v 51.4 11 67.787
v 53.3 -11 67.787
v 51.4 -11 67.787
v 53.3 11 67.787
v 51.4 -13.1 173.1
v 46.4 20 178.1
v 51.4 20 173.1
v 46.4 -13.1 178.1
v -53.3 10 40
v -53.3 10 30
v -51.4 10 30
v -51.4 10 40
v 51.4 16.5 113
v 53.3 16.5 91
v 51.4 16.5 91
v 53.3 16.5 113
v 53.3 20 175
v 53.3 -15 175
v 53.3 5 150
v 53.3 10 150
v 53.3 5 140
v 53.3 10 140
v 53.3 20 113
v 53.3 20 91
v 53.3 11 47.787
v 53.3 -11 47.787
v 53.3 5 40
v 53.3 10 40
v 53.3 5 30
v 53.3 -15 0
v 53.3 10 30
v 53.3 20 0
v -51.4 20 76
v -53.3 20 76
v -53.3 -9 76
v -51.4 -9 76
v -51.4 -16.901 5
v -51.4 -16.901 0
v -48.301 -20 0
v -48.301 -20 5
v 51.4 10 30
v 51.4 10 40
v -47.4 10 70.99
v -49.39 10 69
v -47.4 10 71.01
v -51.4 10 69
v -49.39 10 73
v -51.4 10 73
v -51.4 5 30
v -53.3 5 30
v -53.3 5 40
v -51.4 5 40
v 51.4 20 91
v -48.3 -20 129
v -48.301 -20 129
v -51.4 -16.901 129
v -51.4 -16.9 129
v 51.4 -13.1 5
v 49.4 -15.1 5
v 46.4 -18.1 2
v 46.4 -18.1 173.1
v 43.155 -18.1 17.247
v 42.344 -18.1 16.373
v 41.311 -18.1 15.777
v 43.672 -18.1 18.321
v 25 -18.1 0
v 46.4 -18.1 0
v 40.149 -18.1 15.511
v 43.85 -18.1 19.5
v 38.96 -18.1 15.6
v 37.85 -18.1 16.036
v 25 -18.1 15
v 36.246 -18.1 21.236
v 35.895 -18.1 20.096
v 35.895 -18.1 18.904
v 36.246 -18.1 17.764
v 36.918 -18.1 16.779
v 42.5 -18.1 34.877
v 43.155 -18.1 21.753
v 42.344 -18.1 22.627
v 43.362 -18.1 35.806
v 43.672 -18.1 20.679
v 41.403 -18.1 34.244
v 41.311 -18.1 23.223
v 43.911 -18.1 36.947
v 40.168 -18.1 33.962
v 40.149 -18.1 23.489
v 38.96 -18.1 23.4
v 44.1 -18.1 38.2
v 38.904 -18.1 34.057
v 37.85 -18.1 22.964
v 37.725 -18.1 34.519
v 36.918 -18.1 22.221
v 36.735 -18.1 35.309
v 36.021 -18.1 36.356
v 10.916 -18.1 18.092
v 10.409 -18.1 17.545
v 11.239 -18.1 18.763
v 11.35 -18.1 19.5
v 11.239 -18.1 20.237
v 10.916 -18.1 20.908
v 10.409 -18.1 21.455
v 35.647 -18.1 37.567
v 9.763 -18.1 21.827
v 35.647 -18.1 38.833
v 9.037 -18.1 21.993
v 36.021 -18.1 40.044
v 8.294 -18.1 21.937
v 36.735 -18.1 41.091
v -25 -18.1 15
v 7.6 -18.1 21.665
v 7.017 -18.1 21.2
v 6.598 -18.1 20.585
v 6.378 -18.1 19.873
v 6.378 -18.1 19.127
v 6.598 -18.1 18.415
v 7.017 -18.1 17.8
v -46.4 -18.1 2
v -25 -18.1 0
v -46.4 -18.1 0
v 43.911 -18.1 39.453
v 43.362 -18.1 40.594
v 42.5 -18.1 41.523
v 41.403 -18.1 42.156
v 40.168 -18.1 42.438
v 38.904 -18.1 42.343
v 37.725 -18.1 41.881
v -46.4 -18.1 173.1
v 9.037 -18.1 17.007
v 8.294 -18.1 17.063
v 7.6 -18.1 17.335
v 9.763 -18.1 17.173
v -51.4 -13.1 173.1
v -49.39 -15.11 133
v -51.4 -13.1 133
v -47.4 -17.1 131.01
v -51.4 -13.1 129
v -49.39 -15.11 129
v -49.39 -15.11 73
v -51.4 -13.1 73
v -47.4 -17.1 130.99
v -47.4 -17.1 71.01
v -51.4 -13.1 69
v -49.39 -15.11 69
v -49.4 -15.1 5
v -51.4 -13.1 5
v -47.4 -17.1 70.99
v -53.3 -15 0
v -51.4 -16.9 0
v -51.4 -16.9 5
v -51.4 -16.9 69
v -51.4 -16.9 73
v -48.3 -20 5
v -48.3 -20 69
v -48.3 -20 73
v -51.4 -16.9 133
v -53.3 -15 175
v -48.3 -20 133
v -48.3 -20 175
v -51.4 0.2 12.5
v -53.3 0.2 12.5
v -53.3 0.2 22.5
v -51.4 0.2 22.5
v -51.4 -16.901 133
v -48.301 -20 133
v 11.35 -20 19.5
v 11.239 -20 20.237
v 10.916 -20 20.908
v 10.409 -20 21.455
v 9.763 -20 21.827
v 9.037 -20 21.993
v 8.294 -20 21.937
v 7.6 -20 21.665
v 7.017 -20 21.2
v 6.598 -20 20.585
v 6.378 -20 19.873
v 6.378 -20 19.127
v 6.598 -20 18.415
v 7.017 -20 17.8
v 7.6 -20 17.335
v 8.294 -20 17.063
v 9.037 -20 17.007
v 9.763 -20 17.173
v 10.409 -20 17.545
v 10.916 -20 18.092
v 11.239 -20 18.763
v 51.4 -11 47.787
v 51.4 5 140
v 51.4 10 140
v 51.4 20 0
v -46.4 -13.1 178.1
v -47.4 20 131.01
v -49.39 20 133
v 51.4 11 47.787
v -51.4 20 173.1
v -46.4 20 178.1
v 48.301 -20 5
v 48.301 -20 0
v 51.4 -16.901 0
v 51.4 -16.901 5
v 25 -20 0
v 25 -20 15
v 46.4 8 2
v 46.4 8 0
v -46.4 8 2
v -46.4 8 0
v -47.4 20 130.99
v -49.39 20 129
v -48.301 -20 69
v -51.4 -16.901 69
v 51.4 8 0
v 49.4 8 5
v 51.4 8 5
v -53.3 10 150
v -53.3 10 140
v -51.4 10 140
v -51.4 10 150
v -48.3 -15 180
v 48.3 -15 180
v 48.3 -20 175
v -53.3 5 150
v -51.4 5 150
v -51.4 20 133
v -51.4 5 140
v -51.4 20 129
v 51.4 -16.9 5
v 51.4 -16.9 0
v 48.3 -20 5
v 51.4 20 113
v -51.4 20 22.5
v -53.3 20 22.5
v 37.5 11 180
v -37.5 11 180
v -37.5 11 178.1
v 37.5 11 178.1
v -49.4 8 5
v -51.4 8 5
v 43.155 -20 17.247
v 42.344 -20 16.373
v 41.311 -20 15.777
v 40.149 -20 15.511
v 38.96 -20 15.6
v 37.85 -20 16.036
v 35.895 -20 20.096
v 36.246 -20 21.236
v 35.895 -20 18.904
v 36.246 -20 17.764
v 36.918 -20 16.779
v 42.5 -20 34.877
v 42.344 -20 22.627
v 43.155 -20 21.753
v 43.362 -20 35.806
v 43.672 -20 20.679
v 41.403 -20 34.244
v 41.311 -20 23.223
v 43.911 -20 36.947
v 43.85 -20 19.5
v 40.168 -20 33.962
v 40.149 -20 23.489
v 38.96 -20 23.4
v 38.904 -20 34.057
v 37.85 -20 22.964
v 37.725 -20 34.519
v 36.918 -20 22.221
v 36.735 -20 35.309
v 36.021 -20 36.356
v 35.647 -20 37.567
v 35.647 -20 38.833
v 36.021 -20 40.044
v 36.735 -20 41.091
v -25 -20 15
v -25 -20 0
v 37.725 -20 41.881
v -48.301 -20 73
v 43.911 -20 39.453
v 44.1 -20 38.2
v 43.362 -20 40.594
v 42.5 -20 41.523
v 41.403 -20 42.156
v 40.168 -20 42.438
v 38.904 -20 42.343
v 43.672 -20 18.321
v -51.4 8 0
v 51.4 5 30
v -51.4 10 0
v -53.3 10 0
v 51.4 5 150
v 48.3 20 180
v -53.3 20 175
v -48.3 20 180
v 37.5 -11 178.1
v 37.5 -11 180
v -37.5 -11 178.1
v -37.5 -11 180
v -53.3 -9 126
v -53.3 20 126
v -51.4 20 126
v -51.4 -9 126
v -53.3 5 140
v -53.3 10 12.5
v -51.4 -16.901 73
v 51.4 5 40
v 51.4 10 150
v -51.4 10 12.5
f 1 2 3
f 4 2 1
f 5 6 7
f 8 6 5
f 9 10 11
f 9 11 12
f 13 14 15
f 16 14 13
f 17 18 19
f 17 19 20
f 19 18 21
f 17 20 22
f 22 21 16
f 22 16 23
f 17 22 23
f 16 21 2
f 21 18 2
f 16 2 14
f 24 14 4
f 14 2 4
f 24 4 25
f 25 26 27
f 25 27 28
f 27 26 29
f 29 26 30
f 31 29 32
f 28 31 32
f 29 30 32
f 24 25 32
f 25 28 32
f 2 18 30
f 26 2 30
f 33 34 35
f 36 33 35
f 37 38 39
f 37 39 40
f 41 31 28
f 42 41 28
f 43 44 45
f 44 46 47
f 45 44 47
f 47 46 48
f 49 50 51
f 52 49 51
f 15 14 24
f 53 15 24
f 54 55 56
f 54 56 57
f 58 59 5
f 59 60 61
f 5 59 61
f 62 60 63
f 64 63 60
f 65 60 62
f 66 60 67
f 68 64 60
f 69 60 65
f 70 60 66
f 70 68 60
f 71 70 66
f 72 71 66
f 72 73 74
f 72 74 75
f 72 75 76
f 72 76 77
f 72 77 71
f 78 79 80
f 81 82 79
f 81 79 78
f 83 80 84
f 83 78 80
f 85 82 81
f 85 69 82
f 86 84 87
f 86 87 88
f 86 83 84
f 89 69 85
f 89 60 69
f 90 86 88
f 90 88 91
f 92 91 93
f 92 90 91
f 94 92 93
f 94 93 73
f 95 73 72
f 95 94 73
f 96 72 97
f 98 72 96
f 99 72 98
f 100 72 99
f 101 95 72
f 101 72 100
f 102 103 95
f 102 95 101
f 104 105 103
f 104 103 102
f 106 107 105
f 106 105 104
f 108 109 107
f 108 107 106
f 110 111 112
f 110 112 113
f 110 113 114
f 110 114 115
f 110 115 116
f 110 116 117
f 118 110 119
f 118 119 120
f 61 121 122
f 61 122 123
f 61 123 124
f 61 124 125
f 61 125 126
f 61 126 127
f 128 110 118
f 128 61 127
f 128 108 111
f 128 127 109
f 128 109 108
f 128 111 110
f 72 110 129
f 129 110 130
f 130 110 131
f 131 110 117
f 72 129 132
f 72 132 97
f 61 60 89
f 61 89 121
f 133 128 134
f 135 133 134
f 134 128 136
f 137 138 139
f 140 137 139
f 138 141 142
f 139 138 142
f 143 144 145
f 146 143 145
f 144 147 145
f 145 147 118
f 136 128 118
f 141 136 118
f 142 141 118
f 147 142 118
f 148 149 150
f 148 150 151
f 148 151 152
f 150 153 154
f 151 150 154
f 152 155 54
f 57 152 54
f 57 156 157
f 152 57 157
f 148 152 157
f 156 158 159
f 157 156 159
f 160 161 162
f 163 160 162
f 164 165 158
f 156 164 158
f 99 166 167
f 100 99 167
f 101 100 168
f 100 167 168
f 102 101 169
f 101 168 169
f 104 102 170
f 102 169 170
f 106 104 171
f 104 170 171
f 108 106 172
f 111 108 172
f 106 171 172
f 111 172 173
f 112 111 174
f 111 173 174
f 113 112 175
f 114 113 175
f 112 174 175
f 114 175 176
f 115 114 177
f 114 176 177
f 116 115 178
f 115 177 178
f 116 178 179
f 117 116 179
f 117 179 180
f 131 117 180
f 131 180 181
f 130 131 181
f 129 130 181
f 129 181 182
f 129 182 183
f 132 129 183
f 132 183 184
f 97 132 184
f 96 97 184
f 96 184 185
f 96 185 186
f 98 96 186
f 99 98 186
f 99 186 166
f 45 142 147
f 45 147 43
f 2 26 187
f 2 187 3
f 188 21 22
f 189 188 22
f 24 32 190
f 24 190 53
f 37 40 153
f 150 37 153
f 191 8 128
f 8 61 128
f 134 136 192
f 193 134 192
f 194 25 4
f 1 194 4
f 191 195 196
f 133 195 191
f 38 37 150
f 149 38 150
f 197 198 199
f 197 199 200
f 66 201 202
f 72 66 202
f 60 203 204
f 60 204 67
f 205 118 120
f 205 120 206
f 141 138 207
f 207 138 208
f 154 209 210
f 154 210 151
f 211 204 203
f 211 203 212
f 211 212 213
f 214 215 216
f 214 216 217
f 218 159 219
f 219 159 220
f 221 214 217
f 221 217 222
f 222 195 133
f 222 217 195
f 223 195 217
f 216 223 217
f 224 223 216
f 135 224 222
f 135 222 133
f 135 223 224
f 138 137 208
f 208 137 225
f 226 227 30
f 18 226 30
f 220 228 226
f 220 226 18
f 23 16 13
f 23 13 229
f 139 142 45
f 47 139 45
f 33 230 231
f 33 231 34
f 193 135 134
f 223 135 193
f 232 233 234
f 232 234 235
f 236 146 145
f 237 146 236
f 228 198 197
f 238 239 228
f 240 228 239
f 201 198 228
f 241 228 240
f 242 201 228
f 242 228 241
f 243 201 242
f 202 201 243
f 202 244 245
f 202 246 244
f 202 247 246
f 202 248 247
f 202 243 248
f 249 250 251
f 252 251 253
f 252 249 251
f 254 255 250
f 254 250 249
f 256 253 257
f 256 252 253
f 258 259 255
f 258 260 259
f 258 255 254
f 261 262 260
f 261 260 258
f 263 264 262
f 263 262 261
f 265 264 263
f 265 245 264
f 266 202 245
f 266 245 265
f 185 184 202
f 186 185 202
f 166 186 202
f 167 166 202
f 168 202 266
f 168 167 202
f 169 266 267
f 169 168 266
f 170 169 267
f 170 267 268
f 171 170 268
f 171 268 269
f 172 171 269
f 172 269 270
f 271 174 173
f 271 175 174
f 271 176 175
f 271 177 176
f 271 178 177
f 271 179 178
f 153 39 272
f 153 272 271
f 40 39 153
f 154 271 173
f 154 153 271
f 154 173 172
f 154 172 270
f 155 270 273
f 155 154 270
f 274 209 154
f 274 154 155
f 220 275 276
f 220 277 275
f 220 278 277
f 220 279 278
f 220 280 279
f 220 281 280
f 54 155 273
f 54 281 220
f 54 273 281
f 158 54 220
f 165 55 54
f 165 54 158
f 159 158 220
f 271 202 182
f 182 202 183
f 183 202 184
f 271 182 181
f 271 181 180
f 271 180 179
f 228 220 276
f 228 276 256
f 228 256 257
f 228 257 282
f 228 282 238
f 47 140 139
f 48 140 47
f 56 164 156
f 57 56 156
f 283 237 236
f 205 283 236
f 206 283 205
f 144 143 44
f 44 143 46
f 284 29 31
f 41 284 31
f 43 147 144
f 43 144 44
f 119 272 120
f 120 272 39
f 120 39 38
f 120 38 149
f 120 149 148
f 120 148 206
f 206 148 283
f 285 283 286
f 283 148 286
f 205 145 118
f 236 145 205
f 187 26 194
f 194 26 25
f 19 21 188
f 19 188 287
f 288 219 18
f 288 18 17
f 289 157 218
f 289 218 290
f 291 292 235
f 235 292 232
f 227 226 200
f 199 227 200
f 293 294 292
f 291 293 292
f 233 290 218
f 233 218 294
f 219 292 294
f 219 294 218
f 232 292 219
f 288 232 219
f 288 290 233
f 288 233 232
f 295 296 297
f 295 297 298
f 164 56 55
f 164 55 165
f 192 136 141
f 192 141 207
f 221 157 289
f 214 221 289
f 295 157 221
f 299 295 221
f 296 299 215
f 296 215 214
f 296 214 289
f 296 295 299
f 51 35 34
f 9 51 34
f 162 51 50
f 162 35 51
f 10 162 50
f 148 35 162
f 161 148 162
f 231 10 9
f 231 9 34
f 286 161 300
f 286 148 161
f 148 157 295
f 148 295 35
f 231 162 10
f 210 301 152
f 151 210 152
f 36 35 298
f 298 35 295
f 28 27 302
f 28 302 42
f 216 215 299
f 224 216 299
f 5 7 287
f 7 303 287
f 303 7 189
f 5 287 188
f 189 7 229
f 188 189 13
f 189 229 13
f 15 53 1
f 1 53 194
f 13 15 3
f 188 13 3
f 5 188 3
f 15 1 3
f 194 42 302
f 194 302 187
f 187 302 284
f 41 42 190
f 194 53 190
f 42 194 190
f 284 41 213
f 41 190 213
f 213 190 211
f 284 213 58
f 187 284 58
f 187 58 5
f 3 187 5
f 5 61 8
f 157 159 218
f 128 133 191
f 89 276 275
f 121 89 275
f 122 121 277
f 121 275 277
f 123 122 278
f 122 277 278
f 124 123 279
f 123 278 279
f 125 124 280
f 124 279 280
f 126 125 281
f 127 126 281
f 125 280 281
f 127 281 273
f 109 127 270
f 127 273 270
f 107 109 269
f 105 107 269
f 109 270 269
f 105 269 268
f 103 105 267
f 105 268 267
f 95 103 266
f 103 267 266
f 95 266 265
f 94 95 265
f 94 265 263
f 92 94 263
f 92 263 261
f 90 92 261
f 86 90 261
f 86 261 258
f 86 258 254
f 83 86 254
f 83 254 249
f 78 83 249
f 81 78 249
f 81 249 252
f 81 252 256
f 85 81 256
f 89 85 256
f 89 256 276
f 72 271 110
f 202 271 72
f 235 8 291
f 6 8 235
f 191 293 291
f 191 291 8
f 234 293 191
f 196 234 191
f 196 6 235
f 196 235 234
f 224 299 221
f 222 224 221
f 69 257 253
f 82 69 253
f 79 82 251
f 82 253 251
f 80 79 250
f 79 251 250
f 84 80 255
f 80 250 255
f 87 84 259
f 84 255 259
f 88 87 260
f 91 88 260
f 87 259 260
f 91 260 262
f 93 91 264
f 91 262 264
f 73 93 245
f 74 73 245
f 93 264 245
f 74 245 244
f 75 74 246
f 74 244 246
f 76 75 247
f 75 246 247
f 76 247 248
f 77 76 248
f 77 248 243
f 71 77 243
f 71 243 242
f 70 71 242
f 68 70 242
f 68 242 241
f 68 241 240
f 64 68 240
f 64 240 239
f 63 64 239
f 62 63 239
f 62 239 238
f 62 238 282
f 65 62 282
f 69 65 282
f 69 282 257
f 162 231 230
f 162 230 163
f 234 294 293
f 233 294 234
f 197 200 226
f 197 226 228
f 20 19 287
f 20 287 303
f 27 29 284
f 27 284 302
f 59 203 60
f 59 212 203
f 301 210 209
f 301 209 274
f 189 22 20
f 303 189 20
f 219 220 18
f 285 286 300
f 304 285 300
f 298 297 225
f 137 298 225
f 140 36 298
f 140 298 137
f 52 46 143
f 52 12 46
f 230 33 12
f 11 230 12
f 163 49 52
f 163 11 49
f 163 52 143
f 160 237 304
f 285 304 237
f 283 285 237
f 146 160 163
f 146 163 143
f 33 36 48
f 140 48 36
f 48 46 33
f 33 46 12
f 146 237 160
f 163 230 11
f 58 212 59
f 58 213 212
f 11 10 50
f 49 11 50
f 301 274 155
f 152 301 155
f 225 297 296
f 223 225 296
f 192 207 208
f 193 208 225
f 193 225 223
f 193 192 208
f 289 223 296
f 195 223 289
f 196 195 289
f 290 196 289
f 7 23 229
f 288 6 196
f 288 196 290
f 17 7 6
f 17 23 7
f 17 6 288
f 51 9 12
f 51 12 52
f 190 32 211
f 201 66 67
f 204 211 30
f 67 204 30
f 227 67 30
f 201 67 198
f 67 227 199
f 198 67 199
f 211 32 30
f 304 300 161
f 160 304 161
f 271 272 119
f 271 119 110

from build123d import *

# Parameters (mm, degrees)
SKETCH_W        = 106.6
SKETCH_H        = 40
PAD_DEPTH       = 180
SKETCH001_W     = 102.8
SKETCH001_H     = 176.2
POCKET_DEPTH    = 38.1
SKETCH002_W     = 102.8
SKETCH002_H     = 1.9
POCKET001_DEPTH = 38.1
SKETCH003_W     = 50
SKETCH003_H     = 15
POCKET002_DEPTH = 5
SKETCH004_W     = 22
SKETCH004_H     = 20
POCKET003_DEPTH = 5
SKETCH005_W     = 75
SKETCH005_H     = 22
POCKET004_DEPTH = 5
SKETCH006_R     = 4
SKETCH006_R_2   = 4.25
POCKET005_DEPTH = 5
CHAMFER_SIZE    = 5
CHAMFER001_SIZE = 5
SKETCH007_W     = 5
SKETCH007_H     = 10
POCKET006_DEPTH = 5
SKETCH008_W     = 5
SKETCH008_H     = 10
POCKET007_DEPTH = 5
SKETCH009_W     = 19.8
SKETCH009_H     = 10
POCKET008_DEPTH = 5
SKETCH010_W     = 40
SKETCH010_H     = 5
PAD001_DEPTH    = 5
CHAMFER002_SIZE = 3.099
CHAMFER003_SIZE = 3
SKETCH011_W     = 40
SKETCH011_H     = 5
PAD002_DEPTH    = 5
CHAMFER004_SIZE = 3.099
CHAMFER005_SIZE = 3
SKETCH012_W     = 3.5
SKETCH012_H     = 22
POCKET009_DEPTH = 5
SKETCH013_W     = 3.5
SKETCH013_H     = 22
POCKET010_DEPTH = 5
SKETCH014_W     = 29
SKETCH014_H     = 50
POCKET011_DEPTH = 5
SKETCH015_W     = 102.8
SKETCH015_H     = 12
POCKET012_DEPTH = 5
SKETCH016_W     = 10
SKETCH016_H     = 12.5
POCKET013_DEPTH = 5
SKETCH017_W     = 40
SKETCH017_H     = 4
PAD003_DEPTH    = 4
CHAMFER006_SIZE = 3.099
CHAMFER007_SIZE = 1.99
SKETCH018_R     = 2.5
POCKET014_DEPTH = 5
SKETCH019_W     = 10
SKETCH019_H     = 8
POCKET015_DEPTH = 5


with BuildPart() as part:
    # Sketch → Pad (new body)
    with BuildSketch(Plane.XY):
        Rectangle(SKETCH_W, SKETCH_H)
    extrude(amount=PAD_DEPTH)

    # Sketch001 (on Face1 of Pad) → Pocket (cut)
    with BuildSketch(Plane(origin=(0, 20, 0), x_dir=(-1, 0, 0), z_dir=(0, 1, 0))):
        with Locations((0, 90)):
            Rectangle(SKETCH001_W, SKETCH001_H)
    extrude(amount=-POCKET_DEPTH, mode=Mode.SUBTRACT)

    # Sketch002 (on Face1 of Pocket) → Pocket001 (cut)
    with BuildSketch(Plane(origin=(0, 20, 0), x_dir=(-1, 0, 0), z_dir=(0, 1, 0))):
        with Locations((0, 0.95)):
            Rectangle(SKETCH002_W, SKETCH002_H)
    extrude(amount=-POCKET001_DEPTH, mode=Mode.SUBTRACT)

    # Sketch003 (on Face11 of Pocket001) → Pocket002 (cut)
    with BuildSketch(Plane.XZ.offset(20)):
        with Locations((0, 7.5)):
            Rectangle(SKETCH003_W, SKETCH003_H)
    extrude(amount=-POCKET002_DEPTH, mode=Mode.SUBTRACT)

    # Sketch004 (on Face9 of Pocket002) → Pocket003 (cut)
    with BuildSketch(Plane.YZ.offset(53.3)):
        with Locations((0, 57.78728)):
            Rectangle(SKETCH004_W, SKETCH004_H)
    extrude(amount=-POCKET003_DEPTH, mode=Mode.SUBTRACT)

    # Sketch005 (on Face10 of Pocket003) → Pocket004 (cut)
    with BuildSketch(Plane.XY.offset(180)):
        Rectangle(SKETCH005_W, SKETCH005_H)
    extrude(amount=-POCKET004_DEPTH, mode=Mode.SUBTRACT)

    # Sketch006 (on Face12 of Pocket004) → Pocket005 (cut)
    with BuildSketch(Plane.XZ.offset(20)):
        with Locations((39.85, 19.5)):
            Circle(SKETCH006_R)
        with Locations((39.85, 38.2)):
            Circle(SKETCH006_R_2)
    extrude(amount=-POCKET005_DEPTH, mode=Mode.SUBTRACT)

    # Chamfer
    chamfer_edges = [part.edges().sort_by_distance(p)[0] for p in [
        (-51.4, -18.1, 90),
        (-51.4, 0.95, 178.1),
        (0, -18.1, 178.1),
        (51.4, -18.1, 90),
        (51.4, 0.95, 178.1),
    ]]
    chamfer(chamfer_edges, length=CHAMFER_SIZE)

    # Chamfer001
    chamfer001_edges = [part.edges().sort_by_distance(p)[0] for p in [
        (53.3, -20, 90),
        (-53.3, -20, 90),
        (0, -20, 180),
        (53.3, 0, 180),
        (-53.3, 0, 180),
    ]]
    chamfer(chamfer001_edges, length=CHAMFER001_SIZE)

    # Sketch007 (on Face9 of Chamfer001) → Pocket006 (cut)
    with BuildSketch(Plane.YZ.offset(53.3)):
        with Locations((7.5, 145)):
            Rectangle(SKETCH007_W, SKETCH007_H)
        with Locations((7.5, 35)):
            Rectangle(SKETCH007_W, SKETCH007_H)
    extrude(amount=-POCKET006_DEPTH, mode=Mode.SUBTRACT)

    # Sketch008 (on Face2 of Pocket006) → Pocket007 (cut)
    with BuildSketch(Plane(origin=(-53.3, 0, 0), x_dir=(0, -1, 0), z_dir=(-1, 0, 0))):
        with Locations((-7.5, 145)):
            Rectangle(SKETCH008_W, SKETCH008_H)
        with Locations((-7.5, 35)):
            Rectangle(SKETCH008_W, SKETCH008_H)
    extrude(amount=-POCKET007_DEPTH, mode=Mode.SUBTRACT)

    # Sketch009 (on Face2 of Pocket007) → Pocket008 (cut)
    with BuildSketch(Plane(origin=(-53.3, 0, 0), x_dir=(0, -1, 0), z_dir=(-1, 0, 0))):
        with Locations((-10.1, 17.5)):
            Rectangle(SKETCH009_W, SKETCH009_H)
    extrude(amount=-POCKET008_DEPTH, mode=Mode.SUBTRACT)

    # Sketch010 (on Face4 of Pocket008) → Pad001 (join)
    with BuildSketch(Plane.YZ.offset(-51.4)):
        with Locations((0, 2.5)):
            Rectangle(SKETCH010_W, SKETCH010_H)
    extrude(amount=PAD001_DEPTH)

    # Chamfer002
    chamfer002_edges = [part.edges().sort_by_distance(p)[0] for p in [
        (-51.4, -20, 2.5),
    ]]
    chamfer(chamfer002_edges, length=CHAMFER002_SIZE)

    # Chamfer003
    chamfer003_edges = [part.edges().sort_by_distance(p)[0] for p in [
        (-46.4, 0.95, 5),
    ]]
    chamfer(chamfer003_edges, length=CHAMFER003_SIZE)

    # Sketch011 (on Face27 of Chamfer003) → Pad002 (join)
    with BuildSketch(Plane(origin=(51.4, 0, 0), x_dir=(0, -1, 0), z_dir=(-1, 0, 0))):
        with Locations((0, 2.5)):
            Rectangle(SKETCH011_W, SKETCH011_H)
    extrude(amount=PAD002_DEPTH)

    # Chamfer004
    chamfer004_edges = [part.edges().sort_by_distance(p)[0] for p in [
        (51.4, -20, 2.5),
    ]]
    chamfer(chamfer004_edges, length=CHAMFER004_SIZE)

    # Chamfer005
    chamfer005_edges = [part.edges().sort_by_distance(p)[0] for p in [
        (46.4, 0.95, 5),
    ]]
    chamfer(chamfer005_edges, length=CHAMFER005_SIZE)

    # Sketch012 (on Face15 of Chamfer005) → Pocket009 (cut)
    with BuildSketch(Plane.YZ.offset(53.3)):
        with Locations((18.25, 102)):
            Rectangle(SKETCH012_W, SKETCH012_H)
    extrude(amount=-POCKET009_DEPTH, mode=Mode.SUBTRACT)

    # Sketch013 (on Face52 of Pocket009) → Pocket010 (cut)
    with BuildSketch(Plane(origin=(-53.3, 0, 0), x_dir=(0, -1, 0), z_dir=(-1, 0, 0))):
        with Locations((-18.25, 102)):
            Rectangle(SKETCH013_W, SKETCH013_H)
    extrude(amount=-POCKET010_DEPTH, mode=Mode.SUBTRACT)

    # Sketch014 (on Face52 of Pocket010) → Pocket011 (cut)
    with BuildSketch(Plane(origin=(-53.3, 0, 0), x_dir=(0, -1, 0), z_dir=(-1, 0, 0))):
        with Locations((-5.5, 101)):
            Rectangle(SKETCH014_W, SKETCH014_H)
    extrude(amount=-POCKET011_DEPTH, mode=Mode.SUBTRACT)

    # Sketch015 (on Face6 of Pocket011) → Pocket012 (cut)
    with BuildSketch(Plane(origin=(0, 0, 0), x_dir=(1, 0, 0), z_dir=(0, 0, -1))):
        with Locations((0, -14)):
            Rectangle(SKETCH015_W, SKETCH015_H)
    extrude(amount=-POCKET012_DEPTH, mode=Mode.SUBTRACT)

    # Sketch016 (on Face37 of Pocket012) → Pocket013 (cut)
    with BuildSketch(Plane(origin=(-53.3, 0, 0), x_dir=(0, -1, 0), z_dir=(-1, 0, 0))):
        with Locations((-15, 6.25)):
            Rectangle(SKETCH016_W, SKETCH016_H)
    extrude(amount=-POCKET013_DEPTH, mode=Mode.SUBTRACT)

    # Sketch017 (on Face32 of Pocket013) → Pad003 (join)
    with BuildSketch(Plane.YZ.offset(-51.4)):
        with Locations((0, 71)):
            Rectangle(SKETCH017_W, SKETCH017_H)
        with Locations((0, 131)):
            Rectangle(SKETCH017_W, SKETCH017_H)
    extrude(amount=PAD003_DEPTH)

    # Chamfer006
    chamfer006_edges = [part.edges().sort_by_distance(p)[0] for p in [
        (-51.4, -20, 131),
        (-51.4, -20, 71),
    ]]
    chamfer(chamfer006_edges, length=CHAMFER006_SIZE)

    # Chamfer007
    chamfer007_edges = [part.edges().sort_by_distance(p)[0] for p in [
        (-47.4, 1.45, 129),
        (-47.4, 1.45, 133),
        (-47.4, 1.45, 73),
        (-47.4, 1.45, 69),
    ]]
    chamfer(chamfer007_edges, length=CHAMFER007_SIZE)

    # Sketch018 (on Face66 of Chamfer007) → Pocket014 (cut)
    with BuildSketch(Plane.XZ.offset(20)):
        with Locations((8.85, 19.5)):
            Circle(SKETCH018_R)
    extrude(amount=-POCKET014_DEPTH, mode=Mode.SUBTRACT)

    # Sketch019 (on Face8 of Pocket014) → Pocket015 (cut)
    with BuildSketch(Plane.YZ.offset(-51.4)):
        with Locations((15, 72)):
            Rectangle(SKETCH019_W, SKETCH019_H)
    extrude(amount=POCKET015_DEPTH, mode=Mode.SUBTRACT)


solid = part.part
